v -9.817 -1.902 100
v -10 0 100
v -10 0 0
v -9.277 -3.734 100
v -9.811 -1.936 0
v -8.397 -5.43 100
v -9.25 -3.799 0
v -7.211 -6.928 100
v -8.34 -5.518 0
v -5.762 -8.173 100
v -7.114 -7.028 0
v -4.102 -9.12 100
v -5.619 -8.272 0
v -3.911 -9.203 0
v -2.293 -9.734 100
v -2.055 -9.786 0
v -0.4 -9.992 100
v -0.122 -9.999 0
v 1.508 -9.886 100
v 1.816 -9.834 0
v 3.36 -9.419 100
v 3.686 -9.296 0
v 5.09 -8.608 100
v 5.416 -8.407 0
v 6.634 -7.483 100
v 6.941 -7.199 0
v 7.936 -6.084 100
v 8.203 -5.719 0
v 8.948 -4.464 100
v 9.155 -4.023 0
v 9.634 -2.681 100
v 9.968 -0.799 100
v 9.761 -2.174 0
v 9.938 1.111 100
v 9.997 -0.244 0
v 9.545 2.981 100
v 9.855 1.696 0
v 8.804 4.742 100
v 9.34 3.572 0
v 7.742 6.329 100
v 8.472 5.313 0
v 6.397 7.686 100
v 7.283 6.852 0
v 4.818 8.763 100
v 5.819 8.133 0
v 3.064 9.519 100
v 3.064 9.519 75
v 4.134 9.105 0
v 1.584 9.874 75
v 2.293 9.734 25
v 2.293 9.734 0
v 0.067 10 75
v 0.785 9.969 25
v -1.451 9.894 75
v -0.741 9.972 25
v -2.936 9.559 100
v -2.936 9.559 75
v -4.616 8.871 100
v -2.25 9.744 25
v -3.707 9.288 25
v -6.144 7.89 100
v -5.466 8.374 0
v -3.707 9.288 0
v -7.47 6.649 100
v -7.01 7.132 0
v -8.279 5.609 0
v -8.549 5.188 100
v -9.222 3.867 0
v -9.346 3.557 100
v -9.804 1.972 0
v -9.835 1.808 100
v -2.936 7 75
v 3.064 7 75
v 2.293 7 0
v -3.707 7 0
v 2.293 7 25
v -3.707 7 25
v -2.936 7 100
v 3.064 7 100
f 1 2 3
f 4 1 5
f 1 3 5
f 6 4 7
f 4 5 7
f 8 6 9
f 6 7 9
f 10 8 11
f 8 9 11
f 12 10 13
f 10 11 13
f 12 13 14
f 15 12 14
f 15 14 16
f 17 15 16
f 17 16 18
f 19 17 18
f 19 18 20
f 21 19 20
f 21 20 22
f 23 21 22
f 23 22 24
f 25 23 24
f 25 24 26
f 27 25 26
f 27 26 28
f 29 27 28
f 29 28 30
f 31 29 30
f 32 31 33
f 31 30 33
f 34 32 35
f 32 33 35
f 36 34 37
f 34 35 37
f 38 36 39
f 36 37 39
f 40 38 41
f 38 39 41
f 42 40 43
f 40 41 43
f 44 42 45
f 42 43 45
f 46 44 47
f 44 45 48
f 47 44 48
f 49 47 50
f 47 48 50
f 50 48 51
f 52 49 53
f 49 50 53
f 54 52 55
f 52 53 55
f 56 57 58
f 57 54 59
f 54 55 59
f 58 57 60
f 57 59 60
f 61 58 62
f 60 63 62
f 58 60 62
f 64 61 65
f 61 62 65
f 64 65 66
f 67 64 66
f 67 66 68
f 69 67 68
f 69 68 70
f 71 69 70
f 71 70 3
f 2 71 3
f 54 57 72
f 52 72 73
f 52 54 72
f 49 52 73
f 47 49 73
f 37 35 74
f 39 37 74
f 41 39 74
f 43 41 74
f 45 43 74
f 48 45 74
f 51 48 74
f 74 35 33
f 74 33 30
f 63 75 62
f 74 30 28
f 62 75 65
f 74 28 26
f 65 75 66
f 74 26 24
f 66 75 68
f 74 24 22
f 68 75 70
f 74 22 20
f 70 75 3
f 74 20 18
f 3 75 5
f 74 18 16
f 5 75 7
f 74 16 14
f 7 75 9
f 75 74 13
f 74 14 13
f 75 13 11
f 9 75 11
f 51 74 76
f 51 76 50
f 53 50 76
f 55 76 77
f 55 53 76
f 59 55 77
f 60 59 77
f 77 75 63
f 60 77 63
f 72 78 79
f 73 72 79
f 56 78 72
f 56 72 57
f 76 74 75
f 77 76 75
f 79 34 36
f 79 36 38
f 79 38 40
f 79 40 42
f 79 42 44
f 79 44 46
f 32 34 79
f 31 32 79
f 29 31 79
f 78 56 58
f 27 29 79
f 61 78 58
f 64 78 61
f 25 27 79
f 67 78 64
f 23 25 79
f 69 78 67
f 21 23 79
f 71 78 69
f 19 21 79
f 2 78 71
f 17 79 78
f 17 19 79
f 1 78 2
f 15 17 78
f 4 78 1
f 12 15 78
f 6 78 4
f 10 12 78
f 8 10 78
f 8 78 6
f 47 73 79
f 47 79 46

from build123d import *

# Parameters (mm, degrees)
SKETCH1_R           = 10
SHAFT_D20X100_DEPTH = 100
SKETCH3_W           = 6
SKETCH3_H           = 3
KEYWAY_6X25_DEPTH   = 25
SKETCH4_W           = 6
SKETCH4_H           = 3
KEYWAT2_6X25_DEPTH  = 25


with BuildPart() as part:
    # Sketch1 → Shaft_D20x100 (new body)
    with BuildSketch(Plane.XY):
        with Locations(Location((0, 0, 0), (0, 0, 180))):
            Circle(SKETCH1_R)
    extrude(amount=SHAFT_D20X100_DEPTH)

    # Sketch3 → Keyway_6x25 (cut)
    with BuildSketch(Plane(origin=(0, 0, 0), x_dir=(-1, 0, 0), z_dir=(0, 0, -1))):
        with Locations((0.706795811, 8.5)):
            Rectangle(SKETCH3_W, SKETCH3_H)
    extrude(amount=-KEYWAY_6X25_DEPTH, mode=Mode.SUBTRACT)

    # Sketch4 → keywat2_6x25 (cut)
    with BuildSketch(Plane.XY.offset(100)):
        with Locations((0.063890127, 8.5)):
            Rectangle(SKETCH4_W, SKETCH4_H)
    extrude(amount=-KEYWAT2_6X25_DEPTH, mode=Mode.SUBTRACT)


solid = part.part
